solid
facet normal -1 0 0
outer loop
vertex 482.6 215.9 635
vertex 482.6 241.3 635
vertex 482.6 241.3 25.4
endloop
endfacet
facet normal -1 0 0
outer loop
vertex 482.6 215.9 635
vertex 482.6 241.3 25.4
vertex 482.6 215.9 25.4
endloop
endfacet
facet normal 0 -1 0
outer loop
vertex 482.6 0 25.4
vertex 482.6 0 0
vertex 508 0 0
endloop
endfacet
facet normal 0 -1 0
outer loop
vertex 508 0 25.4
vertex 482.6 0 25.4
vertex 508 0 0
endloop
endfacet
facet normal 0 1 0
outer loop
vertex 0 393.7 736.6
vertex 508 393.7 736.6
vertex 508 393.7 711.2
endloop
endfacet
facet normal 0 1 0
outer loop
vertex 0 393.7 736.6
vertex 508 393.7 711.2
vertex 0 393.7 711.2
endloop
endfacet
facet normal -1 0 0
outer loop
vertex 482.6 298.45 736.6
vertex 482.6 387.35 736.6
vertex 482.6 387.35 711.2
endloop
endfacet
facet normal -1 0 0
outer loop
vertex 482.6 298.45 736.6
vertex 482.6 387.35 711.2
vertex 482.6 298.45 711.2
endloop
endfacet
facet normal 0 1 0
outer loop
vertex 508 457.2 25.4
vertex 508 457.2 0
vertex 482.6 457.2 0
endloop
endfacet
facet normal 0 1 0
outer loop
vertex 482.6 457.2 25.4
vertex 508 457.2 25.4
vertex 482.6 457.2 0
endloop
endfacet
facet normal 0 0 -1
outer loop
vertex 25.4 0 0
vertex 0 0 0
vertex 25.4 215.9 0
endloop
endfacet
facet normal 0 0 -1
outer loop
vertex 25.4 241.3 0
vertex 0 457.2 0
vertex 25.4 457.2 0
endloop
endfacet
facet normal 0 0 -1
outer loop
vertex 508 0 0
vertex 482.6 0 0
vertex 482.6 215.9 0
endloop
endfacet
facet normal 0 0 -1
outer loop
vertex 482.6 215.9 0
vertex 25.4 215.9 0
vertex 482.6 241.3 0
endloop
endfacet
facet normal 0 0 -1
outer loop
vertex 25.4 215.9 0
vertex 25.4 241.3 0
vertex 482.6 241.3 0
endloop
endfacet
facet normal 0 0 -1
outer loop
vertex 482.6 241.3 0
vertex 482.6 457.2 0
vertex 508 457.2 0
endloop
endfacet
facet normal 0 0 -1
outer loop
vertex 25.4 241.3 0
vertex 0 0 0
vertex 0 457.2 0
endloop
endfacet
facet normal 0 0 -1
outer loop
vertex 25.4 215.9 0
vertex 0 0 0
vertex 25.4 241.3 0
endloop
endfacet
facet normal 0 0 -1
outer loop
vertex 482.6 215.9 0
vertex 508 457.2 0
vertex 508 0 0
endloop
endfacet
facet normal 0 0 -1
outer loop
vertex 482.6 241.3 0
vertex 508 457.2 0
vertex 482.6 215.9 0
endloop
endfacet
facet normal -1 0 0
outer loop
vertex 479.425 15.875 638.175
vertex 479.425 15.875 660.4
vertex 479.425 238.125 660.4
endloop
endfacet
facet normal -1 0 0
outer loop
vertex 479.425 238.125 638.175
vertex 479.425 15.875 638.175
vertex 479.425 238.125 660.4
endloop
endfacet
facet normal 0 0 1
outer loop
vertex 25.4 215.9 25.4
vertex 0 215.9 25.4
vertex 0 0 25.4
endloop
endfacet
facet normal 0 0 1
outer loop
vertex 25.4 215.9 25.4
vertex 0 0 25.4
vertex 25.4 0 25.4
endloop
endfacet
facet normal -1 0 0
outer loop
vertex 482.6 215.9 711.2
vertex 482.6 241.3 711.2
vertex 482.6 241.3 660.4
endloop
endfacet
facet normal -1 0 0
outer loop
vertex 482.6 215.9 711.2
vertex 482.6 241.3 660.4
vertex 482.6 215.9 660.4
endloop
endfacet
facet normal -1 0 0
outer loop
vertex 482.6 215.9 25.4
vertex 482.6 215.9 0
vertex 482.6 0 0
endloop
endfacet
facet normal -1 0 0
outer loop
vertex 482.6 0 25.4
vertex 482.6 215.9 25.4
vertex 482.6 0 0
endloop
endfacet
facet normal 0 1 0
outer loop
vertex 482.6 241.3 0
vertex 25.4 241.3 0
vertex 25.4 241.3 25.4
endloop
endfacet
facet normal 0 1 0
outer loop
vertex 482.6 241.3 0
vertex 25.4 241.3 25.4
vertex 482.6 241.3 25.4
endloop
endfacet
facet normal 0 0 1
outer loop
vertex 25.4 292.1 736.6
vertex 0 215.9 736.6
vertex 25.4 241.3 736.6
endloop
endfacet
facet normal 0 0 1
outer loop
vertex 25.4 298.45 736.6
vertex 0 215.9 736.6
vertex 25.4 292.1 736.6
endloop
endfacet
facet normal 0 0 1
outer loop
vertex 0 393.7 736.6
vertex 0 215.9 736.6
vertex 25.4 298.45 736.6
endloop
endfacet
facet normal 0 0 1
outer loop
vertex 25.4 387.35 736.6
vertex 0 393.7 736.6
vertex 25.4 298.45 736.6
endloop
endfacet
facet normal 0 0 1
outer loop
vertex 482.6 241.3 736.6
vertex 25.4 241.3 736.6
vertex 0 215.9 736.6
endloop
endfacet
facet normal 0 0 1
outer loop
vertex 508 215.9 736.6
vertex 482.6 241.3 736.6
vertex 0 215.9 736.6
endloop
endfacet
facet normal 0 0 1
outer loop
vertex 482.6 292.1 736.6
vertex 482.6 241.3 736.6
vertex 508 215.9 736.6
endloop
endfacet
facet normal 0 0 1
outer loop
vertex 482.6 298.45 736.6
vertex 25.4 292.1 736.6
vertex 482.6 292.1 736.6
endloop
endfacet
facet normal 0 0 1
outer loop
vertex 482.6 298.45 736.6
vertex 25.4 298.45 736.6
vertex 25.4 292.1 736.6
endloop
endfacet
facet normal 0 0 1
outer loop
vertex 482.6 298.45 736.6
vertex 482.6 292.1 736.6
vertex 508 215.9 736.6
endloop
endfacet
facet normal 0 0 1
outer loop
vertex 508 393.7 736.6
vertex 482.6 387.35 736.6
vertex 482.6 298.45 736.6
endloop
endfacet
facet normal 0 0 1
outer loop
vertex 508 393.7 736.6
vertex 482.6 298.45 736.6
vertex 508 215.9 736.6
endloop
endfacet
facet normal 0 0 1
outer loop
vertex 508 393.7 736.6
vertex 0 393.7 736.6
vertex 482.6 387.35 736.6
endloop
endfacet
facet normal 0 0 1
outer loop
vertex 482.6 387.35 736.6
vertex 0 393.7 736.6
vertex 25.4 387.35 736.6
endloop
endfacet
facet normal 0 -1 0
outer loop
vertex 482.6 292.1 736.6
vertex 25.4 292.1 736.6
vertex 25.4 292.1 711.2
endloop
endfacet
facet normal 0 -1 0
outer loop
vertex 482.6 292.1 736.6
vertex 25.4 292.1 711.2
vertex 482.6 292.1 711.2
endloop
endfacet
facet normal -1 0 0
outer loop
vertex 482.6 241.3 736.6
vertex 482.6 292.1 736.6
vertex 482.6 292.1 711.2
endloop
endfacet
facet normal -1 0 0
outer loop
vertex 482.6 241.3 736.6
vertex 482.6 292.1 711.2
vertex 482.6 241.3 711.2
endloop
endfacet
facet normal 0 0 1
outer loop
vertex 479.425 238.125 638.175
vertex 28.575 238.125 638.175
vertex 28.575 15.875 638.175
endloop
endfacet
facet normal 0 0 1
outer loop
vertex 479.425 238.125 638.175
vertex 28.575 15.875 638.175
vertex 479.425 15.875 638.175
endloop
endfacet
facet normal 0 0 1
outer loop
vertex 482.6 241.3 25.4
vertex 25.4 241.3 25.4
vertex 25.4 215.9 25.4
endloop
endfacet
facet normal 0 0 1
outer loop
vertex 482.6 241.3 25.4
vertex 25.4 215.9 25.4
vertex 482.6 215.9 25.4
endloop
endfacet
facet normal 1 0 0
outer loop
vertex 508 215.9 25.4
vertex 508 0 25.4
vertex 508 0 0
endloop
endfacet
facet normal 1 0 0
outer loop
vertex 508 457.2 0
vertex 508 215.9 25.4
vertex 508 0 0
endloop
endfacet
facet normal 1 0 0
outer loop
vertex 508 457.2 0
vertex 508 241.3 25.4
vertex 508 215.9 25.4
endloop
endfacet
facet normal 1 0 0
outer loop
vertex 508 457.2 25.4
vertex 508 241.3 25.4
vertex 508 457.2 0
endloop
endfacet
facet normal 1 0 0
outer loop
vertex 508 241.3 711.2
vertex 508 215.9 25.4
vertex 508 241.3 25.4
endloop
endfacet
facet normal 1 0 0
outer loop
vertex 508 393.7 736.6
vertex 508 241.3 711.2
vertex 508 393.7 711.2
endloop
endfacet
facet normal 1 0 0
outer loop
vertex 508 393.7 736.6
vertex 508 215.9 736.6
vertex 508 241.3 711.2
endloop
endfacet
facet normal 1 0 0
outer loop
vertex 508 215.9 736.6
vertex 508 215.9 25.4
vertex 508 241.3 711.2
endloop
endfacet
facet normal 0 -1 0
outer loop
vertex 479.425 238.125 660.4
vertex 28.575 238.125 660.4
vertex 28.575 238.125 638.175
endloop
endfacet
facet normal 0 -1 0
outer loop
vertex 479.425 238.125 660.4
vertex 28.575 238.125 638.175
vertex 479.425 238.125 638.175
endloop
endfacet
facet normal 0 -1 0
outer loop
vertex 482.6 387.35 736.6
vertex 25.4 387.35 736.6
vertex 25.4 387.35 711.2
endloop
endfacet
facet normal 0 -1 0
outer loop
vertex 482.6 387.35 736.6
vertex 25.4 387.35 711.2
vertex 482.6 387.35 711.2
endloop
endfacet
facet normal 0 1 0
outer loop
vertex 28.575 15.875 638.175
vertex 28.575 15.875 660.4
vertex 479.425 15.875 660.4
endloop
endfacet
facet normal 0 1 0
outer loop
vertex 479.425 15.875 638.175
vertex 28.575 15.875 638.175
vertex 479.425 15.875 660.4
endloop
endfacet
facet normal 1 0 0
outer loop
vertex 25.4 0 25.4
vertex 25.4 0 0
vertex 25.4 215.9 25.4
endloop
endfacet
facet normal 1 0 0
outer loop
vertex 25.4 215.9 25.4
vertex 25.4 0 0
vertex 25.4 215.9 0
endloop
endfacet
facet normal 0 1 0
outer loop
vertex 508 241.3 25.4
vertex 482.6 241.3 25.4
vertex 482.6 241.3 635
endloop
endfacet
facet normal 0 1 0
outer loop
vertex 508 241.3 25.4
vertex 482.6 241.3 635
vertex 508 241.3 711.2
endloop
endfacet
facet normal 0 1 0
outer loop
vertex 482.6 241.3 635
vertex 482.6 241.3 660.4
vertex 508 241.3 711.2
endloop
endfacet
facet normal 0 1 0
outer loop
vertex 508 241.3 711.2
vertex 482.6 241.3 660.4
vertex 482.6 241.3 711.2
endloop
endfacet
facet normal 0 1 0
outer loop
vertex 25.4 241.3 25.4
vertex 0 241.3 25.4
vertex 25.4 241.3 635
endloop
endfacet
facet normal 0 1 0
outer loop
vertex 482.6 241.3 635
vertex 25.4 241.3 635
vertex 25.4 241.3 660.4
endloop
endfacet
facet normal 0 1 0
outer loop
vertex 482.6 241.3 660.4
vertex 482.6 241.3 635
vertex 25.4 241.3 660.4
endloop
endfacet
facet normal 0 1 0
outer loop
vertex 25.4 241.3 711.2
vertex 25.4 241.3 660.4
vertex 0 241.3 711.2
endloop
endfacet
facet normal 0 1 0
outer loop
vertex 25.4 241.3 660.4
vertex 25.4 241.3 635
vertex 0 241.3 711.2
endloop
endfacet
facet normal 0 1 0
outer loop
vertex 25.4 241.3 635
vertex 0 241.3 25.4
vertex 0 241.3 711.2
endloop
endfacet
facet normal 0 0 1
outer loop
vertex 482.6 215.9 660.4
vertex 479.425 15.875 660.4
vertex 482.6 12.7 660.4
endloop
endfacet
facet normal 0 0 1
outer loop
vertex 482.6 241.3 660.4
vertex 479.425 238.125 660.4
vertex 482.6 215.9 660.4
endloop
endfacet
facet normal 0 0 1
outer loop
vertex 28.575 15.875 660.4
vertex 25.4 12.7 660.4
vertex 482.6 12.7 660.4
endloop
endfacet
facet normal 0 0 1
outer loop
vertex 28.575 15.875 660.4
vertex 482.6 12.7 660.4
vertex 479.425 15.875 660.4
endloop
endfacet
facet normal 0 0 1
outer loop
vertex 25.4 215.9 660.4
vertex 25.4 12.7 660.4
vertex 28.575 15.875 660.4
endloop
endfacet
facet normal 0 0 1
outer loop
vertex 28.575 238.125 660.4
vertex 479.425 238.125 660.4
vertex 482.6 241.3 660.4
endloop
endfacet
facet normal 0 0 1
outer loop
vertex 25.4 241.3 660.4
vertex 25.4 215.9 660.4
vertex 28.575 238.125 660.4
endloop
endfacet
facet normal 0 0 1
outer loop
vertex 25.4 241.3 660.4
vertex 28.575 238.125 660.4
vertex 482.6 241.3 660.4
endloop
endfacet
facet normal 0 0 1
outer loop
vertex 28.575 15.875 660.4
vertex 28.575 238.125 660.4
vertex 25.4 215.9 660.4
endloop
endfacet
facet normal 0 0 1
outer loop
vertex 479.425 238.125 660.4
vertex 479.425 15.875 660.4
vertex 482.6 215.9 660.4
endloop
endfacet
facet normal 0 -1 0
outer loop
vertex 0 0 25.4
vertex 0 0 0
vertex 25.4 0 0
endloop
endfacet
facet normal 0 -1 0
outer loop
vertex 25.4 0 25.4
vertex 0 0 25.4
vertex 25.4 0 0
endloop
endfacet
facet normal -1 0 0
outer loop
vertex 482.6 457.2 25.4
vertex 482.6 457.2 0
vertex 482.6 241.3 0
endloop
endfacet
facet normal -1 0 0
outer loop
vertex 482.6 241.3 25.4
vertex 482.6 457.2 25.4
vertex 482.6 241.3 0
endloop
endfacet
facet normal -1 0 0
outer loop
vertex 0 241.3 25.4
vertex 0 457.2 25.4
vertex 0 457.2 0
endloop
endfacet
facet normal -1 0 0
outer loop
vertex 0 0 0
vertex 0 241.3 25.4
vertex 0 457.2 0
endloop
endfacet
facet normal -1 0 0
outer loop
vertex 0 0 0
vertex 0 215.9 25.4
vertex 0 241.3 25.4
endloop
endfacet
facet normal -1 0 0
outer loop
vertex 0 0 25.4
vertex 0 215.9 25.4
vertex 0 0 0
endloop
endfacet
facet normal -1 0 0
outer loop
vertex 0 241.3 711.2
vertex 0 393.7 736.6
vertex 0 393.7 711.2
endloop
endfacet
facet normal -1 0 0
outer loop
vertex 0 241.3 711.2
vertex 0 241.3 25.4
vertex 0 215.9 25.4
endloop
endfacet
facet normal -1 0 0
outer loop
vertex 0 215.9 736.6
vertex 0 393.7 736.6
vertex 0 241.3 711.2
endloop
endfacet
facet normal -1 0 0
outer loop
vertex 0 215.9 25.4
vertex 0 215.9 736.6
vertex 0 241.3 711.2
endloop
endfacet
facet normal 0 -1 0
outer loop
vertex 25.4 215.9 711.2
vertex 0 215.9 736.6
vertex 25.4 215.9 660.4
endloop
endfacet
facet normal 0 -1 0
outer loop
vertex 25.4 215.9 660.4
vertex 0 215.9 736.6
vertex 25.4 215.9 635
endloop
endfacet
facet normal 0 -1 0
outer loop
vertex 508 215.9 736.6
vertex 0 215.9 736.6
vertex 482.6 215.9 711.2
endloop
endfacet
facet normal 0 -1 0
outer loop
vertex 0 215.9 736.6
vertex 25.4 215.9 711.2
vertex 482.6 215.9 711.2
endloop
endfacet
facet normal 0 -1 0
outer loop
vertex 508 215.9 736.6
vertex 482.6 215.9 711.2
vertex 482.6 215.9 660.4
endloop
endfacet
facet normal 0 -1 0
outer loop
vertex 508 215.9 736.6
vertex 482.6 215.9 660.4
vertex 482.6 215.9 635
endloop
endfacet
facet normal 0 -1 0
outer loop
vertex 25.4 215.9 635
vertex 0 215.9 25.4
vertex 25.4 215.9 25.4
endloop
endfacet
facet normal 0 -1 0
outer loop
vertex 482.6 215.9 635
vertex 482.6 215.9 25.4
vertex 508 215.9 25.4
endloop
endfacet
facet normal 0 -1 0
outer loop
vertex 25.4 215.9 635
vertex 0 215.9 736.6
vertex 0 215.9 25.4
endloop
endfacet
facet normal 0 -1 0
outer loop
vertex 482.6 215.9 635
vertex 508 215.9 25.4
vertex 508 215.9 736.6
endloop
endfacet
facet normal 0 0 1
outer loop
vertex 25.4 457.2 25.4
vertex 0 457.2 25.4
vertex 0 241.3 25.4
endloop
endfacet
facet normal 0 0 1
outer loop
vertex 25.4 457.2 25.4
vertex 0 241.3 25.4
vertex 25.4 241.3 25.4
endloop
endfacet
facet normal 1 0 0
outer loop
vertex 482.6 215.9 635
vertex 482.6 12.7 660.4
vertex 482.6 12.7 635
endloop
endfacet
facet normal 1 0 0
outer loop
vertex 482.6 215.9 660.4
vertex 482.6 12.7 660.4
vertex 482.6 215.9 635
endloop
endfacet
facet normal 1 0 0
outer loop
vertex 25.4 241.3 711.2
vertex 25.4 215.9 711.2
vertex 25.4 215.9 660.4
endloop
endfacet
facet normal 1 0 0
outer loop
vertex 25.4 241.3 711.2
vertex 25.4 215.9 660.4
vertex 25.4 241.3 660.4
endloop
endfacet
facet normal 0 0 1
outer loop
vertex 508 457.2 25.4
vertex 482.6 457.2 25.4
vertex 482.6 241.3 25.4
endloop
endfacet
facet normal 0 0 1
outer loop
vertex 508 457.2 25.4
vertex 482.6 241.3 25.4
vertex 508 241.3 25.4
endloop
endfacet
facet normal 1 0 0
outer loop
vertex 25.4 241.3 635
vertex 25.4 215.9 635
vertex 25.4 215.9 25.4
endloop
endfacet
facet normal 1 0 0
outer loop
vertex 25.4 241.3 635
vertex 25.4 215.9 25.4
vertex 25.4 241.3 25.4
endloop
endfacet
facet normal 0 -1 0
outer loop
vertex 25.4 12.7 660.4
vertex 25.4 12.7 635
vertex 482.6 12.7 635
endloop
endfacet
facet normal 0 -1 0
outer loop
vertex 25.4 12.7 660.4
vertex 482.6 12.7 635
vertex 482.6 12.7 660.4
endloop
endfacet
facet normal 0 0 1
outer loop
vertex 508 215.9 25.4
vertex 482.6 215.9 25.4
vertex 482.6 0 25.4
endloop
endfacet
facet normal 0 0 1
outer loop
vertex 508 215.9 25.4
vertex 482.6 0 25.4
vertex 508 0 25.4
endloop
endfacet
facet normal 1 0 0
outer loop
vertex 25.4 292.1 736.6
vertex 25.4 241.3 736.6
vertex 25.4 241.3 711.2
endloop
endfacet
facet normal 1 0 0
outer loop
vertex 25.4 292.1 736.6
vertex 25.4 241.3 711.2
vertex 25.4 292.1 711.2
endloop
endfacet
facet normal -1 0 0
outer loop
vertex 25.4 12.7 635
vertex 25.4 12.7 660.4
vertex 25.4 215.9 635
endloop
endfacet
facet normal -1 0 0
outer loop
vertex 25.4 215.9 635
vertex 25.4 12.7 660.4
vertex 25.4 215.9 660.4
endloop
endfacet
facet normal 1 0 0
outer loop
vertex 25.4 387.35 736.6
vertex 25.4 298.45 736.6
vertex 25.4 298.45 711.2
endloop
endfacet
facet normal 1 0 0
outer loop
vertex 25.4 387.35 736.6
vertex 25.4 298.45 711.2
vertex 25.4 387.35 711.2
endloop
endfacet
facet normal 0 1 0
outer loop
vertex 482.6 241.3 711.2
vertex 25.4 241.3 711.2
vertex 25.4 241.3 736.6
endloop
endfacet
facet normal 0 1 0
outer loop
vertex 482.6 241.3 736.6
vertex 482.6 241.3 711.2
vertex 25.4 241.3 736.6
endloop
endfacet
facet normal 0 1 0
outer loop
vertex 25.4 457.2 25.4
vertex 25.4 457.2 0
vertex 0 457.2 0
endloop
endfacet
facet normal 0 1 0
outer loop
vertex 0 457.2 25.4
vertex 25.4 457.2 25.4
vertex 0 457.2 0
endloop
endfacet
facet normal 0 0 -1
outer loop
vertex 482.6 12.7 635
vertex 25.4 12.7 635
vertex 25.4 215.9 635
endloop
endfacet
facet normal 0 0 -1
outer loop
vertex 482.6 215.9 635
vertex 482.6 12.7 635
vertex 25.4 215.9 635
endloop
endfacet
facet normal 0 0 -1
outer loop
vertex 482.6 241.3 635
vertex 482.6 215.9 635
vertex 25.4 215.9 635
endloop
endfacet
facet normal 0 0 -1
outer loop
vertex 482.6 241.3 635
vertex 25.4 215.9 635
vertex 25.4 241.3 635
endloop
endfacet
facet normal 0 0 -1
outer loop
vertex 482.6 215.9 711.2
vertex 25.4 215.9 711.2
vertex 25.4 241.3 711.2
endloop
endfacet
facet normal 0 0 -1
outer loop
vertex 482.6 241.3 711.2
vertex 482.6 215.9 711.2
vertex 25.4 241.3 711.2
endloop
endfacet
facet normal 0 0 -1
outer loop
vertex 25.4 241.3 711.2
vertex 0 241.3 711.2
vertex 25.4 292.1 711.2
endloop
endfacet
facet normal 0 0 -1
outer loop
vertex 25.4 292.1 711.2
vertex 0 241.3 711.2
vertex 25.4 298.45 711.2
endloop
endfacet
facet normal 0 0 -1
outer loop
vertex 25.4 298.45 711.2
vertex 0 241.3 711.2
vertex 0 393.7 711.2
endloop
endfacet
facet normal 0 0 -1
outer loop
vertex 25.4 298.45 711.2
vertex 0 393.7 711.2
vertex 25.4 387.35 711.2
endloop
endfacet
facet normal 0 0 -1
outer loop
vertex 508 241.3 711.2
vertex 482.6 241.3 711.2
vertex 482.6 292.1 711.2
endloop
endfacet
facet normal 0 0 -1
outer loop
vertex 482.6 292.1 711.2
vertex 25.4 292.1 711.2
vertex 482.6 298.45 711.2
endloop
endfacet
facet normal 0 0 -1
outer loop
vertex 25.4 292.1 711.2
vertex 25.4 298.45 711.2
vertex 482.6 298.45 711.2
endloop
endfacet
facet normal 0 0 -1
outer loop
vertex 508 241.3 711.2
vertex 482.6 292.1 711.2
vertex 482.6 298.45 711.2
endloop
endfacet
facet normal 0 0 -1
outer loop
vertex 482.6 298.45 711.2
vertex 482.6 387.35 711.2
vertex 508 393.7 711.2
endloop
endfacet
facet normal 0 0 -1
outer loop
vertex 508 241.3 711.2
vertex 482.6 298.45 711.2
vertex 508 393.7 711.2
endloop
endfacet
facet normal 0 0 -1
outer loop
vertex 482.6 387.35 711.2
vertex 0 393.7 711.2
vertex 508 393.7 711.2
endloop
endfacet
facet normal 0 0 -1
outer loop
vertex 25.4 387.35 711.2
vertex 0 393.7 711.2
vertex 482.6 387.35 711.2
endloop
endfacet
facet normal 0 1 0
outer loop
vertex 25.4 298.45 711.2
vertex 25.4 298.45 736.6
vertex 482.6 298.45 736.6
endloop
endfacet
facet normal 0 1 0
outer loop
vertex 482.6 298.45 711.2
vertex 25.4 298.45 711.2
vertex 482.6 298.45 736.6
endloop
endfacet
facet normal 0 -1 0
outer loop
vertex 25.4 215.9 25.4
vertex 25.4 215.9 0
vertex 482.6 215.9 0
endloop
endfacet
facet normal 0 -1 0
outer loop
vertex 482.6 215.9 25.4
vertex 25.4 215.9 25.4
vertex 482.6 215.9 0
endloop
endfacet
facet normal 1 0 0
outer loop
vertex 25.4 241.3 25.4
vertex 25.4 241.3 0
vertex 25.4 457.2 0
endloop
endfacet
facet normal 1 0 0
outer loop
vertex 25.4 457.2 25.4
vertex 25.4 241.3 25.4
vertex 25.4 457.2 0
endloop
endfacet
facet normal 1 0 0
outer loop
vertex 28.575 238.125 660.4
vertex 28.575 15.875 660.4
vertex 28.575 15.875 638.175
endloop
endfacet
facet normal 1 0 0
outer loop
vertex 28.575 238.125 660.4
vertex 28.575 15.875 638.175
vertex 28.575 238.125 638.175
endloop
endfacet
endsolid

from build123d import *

# Parameters (mm, degrees)
F0_W     = 457.2
F0_H     = 25.4
F1_DEPTH = 25.4
F2_W     = 25.4
F2_H     = 25.4
F3_DEPTH = 711.2
F4_W     = 457.2
F4_H     = 6.35
F5_DEPTH = 25.4
F6_W     = 228.6
F6_H     = 25.4
F6_W_2   = 25.4
F7_DEPTH = 457.2
F8_W     = 450.85
F8_H     = 222.25
F9_DEPTH = 22.225


with BuildPart() as f1:
    # F0 (on Top) → F1 (new body)
    with BuildSketch(Plane.XY):
        Polygon((0, 457.2), (0, 0), (25.4, 0), (25.4, 215.9), (25.4, 241.3), (25.4, 457.2), align=None)
        with Locations((254, 228.6)):
            Rectangle(F0_W, F0_H)
        Polygon((482.6, 241.3), (482.6, 215.9), (482.6, 0), (508, 0), (508, 457.2), (482.6, 457.2), align=None)
    extrude(amount=F1_DEPTH)

    # F2 (on face) → F3 (join)
    with BuildSketch(Plane.XY.offset(25.4)):
        with Locations((12.7, 228.6)):
            Rectangle(F2_W, F2_H)
        with Locations((495.3, 228.6)):
            Rectangle(F2_W, F2_H)
    extrude(amount=F3_DEPTH)

    # F4 (on face) → F5 (join)
    with BuildSketch(Plane.XY.offset(736.6)):
        Polygon((0, 393.7), (0, 241.3), (25.4, 241.3), (25.4, 292.1), (25.4, 298.45), (25.4, 342.9), (25.4, 349.25), (25.4, 387.35), (25.4, 393.7), align=None)
        with Locations((254, 295.275)):
            Rectangle(F4_W, F4_H)
        with Locations((254, 390.525)):
            Rectangle(F4_W, F4_H)
        Polygon((482.6, 298.45), (482.6, 292.1), (482.6, 241.3), (508, 241.3), (508, 393.7), (482.6, 393.7), (482.6, 387.35), (482.6, 349.25), (482.6, 342.9), align=None)
    extrude(amount=-F5_DEPTH)

    # F6 (on face) → F7 (join, through all)
    with BuildSketch(Plane.YZ.offset(25.4)):
        with Locations((127, 647.7)):
            Rectangle(F6_W, F6_H)
        with Locations((228.6, 723.9)):
            Rectangle(F6_W_2, F6_H)
    extrude(amount=F7_DEPTH)

    # F8 (on face) → F9 (cut)
    with BuildSketch(Plane.XY.offset(660.4)):
        with Locations((254, 127)):
            Rectangle(F8_W, F8_H)
    extrude(amount=-F9_DEPTH, mode=Mode.SUBTRACT)


solid = f1.part
